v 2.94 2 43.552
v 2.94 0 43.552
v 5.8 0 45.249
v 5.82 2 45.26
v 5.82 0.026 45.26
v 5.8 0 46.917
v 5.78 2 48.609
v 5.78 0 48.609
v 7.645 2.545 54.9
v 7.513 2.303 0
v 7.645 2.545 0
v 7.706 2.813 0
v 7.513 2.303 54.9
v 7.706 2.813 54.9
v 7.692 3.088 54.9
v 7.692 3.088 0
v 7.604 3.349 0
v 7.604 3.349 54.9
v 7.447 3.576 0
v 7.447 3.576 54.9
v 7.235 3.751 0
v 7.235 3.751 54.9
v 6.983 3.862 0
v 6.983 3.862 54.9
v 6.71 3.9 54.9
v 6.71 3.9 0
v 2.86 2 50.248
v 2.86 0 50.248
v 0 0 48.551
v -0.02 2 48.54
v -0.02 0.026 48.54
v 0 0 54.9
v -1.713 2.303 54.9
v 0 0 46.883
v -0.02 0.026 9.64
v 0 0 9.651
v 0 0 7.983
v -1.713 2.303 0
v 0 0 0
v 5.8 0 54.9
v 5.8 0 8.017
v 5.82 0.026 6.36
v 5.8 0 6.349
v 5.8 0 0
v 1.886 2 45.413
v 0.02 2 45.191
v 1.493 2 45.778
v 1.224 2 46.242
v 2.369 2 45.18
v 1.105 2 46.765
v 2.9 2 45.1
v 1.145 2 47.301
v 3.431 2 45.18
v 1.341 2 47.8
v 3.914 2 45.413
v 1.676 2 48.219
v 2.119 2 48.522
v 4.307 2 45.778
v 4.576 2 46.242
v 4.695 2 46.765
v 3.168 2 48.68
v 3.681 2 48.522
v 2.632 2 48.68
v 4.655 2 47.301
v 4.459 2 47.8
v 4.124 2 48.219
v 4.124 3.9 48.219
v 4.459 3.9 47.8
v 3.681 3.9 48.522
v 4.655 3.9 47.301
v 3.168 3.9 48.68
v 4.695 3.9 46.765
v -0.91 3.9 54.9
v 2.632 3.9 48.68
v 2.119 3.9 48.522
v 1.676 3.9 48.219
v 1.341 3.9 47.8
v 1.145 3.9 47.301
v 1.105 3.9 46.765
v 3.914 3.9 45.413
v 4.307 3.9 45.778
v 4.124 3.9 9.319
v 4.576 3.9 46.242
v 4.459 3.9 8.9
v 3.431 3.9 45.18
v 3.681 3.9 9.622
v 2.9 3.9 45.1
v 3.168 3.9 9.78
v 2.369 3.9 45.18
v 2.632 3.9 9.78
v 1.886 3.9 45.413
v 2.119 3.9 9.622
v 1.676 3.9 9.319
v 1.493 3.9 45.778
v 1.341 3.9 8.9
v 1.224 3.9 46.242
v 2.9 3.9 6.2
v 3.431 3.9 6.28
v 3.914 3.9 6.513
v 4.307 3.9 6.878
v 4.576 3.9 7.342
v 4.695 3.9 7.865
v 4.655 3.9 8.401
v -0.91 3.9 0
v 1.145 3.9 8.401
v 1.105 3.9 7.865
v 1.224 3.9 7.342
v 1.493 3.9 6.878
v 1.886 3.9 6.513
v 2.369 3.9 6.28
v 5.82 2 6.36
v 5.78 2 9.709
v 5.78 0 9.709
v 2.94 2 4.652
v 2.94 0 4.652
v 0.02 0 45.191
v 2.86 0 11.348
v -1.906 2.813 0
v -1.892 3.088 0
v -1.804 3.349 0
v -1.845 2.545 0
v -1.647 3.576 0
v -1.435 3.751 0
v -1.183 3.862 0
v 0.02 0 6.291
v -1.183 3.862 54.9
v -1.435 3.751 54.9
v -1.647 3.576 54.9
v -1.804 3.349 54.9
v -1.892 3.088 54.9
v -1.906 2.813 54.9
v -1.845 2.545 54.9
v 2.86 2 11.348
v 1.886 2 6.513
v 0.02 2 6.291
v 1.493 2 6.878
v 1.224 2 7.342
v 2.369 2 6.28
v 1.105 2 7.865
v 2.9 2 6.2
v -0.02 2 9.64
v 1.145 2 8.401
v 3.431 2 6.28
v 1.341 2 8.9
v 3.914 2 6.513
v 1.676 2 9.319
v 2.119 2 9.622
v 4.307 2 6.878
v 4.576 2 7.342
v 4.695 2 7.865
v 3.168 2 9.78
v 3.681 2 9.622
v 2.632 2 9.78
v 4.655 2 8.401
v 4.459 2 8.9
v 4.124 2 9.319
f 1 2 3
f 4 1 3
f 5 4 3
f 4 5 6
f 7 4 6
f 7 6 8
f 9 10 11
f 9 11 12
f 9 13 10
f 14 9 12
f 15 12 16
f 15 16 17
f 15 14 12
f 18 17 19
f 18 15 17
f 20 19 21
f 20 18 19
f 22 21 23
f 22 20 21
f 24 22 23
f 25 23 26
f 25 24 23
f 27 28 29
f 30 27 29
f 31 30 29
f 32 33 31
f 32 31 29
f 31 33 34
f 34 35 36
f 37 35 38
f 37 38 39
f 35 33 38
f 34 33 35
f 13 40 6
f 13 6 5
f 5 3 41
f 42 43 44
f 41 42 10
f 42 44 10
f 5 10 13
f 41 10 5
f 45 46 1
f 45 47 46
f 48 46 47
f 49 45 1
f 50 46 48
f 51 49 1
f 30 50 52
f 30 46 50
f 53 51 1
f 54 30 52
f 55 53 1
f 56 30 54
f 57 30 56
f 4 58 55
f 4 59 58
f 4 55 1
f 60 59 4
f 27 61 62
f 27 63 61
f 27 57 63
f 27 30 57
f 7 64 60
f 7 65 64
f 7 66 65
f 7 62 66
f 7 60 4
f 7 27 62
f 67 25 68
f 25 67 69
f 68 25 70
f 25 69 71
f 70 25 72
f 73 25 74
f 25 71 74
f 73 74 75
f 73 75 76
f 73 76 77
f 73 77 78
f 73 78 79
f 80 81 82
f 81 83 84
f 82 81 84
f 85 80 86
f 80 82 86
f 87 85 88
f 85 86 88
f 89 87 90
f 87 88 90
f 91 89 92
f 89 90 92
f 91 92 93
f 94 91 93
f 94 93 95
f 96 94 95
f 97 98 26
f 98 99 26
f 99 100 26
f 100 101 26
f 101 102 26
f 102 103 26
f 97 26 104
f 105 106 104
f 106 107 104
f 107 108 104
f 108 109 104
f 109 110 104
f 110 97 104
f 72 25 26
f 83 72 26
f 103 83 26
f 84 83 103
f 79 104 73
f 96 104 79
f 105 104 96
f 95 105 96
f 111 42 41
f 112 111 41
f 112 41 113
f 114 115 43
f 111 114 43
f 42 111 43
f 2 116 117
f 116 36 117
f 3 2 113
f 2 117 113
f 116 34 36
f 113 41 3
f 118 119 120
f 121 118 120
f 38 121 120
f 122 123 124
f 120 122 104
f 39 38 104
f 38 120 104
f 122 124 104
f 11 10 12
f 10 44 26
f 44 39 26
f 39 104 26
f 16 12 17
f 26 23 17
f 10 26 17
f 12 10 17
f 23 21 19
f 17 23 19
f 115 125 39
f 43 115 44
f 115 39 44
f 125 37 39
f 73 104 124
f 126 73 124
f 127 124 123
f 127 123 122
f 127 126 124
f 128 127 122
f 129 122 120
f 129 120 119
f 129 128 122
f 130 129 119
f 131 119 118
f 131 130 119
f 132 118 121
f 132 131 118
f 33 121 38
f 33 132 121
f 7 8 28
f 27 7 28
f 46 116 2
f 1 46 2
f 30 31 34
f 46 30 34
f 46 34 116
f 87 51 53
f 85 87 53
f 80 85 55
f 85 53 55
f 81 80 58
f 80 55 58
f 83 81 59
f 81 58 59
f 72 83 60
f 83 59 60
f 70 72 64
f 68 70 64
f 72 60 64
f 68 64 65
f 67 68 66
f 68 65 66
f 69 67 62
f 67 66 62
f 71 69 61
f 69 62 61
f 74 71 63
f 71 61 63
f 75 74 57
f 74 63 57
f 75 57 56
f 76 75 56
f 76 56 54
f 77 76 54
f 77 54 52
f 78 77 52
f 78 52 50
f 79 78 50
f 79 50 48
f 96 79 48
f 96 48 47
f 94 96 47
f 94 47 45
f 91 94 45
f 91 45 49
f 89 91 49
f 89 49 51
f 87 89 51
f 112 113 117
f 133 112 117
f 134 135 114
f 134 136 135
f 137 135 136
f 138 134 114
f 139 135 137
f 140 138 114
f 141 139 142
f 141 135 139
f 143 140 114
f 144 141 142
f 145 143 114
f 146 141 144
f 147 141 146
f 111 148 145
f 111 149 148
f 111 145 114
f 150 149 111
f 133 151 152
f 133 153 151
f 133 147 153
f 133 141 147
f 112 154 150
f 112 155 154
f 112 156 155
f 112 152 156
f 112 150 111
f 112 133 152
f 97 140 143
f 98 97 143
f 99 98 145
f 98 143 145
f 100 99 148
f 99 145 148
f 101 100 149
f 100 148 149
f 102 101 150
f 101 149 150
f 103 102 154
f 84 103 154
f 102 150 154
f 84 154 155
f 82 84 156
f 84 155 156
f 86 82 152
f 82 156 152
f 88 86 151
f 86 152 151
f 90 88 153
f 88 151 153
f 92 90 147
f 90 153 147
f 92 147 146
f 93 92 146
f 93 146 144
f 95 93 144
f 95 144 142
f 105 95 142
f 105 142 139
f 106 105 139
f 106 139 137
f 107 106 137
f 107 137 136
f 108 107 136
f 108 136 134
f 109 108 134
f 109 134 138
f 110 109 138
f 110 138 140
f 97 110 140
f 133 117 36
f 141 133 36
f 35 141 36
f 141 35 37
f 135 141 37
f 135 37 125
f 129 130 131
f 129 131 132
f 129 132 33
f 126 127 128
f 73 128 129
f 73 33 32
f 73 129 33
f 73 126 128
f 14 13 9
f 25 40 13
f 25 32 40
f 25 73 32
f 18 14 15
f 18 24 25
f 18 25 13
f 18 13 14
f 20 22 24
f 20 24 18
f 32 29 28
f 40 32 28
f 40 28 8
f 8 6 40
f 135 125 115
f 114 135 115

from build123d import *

# Parameters (mm, degrees)
BOSS_EXTRUDE1_DEPTH = 54.9
FILLET1_R           = 1
SKETCH2_R           = 1.8
CUT_EXTRUDE1_DEPTH  = 200
CUT_EXTRUDE2_DEPTH  = 2
LPATTERN1_COUNT     = 2
LPATTERN1_PITCH     = 38.9


with BuildPart() as part:
    # Sketch1 → Boss-Extrude1 (new body)
    with BuildSketch(Plane.XY):
        Polygon((0, 0), (5.8, 0), (8.7, 3.9), (-2.9, 3.9), align=None)
    extrude(amount=BOSS_EXTRUDE1_DEPTH)

    # Fillet1
    fillet1_edges = [part.edges().sort_by_distance(p)[0] for p in [
        (-2.9, 3.9, 27.45),
        (8.7, 3.9, 27.45),
    ]]
    fillet(fillet1_edges, radius=FILLET1_R)

    # Sketch2 → Cut-Extrude1 (cut)
    with BuildSketch(Plane.XZ):
        with Locations(Location((2.9, 46.9, 0), (0, 0, 270))):
            Circle(SKETCH2_R)
    cut_extrude1 = extrude(amount=-CUT_EXTRUDE1_DEPTH, mode=Mode.SUBTRACT)

    # Sketch3 → Cut-Extrude2 (cut)
    with BuildSketch(Plane.XZ):
        Polygon((2.93968596, 43.551603614), (5.819639312, 45.260170857), (5.779953352, 48.608567243), (2.86031404, 50.248396386), (-0.019639312, 48.539829143), (0.020046648, 45.191432757), align=None)
    cut_extrude2 = extrude(amount=-CUT_EXTRUDE2_DEPTH, mode=Mode.SUBTRACT)

    # LPattern1: Cut-Extrude1, Cut-Extrude2 ×2
    with Locations(*[(0, 0, -i * LPATTERN1_PITCH) for i in range(1, LPATTERN1_COUNT)]):
        add(cut_extrude1, mode=Mode.SUBTRACT)
        add(cut_extrude2, mode=Mode.SUBTRACT)


solid = part.part
